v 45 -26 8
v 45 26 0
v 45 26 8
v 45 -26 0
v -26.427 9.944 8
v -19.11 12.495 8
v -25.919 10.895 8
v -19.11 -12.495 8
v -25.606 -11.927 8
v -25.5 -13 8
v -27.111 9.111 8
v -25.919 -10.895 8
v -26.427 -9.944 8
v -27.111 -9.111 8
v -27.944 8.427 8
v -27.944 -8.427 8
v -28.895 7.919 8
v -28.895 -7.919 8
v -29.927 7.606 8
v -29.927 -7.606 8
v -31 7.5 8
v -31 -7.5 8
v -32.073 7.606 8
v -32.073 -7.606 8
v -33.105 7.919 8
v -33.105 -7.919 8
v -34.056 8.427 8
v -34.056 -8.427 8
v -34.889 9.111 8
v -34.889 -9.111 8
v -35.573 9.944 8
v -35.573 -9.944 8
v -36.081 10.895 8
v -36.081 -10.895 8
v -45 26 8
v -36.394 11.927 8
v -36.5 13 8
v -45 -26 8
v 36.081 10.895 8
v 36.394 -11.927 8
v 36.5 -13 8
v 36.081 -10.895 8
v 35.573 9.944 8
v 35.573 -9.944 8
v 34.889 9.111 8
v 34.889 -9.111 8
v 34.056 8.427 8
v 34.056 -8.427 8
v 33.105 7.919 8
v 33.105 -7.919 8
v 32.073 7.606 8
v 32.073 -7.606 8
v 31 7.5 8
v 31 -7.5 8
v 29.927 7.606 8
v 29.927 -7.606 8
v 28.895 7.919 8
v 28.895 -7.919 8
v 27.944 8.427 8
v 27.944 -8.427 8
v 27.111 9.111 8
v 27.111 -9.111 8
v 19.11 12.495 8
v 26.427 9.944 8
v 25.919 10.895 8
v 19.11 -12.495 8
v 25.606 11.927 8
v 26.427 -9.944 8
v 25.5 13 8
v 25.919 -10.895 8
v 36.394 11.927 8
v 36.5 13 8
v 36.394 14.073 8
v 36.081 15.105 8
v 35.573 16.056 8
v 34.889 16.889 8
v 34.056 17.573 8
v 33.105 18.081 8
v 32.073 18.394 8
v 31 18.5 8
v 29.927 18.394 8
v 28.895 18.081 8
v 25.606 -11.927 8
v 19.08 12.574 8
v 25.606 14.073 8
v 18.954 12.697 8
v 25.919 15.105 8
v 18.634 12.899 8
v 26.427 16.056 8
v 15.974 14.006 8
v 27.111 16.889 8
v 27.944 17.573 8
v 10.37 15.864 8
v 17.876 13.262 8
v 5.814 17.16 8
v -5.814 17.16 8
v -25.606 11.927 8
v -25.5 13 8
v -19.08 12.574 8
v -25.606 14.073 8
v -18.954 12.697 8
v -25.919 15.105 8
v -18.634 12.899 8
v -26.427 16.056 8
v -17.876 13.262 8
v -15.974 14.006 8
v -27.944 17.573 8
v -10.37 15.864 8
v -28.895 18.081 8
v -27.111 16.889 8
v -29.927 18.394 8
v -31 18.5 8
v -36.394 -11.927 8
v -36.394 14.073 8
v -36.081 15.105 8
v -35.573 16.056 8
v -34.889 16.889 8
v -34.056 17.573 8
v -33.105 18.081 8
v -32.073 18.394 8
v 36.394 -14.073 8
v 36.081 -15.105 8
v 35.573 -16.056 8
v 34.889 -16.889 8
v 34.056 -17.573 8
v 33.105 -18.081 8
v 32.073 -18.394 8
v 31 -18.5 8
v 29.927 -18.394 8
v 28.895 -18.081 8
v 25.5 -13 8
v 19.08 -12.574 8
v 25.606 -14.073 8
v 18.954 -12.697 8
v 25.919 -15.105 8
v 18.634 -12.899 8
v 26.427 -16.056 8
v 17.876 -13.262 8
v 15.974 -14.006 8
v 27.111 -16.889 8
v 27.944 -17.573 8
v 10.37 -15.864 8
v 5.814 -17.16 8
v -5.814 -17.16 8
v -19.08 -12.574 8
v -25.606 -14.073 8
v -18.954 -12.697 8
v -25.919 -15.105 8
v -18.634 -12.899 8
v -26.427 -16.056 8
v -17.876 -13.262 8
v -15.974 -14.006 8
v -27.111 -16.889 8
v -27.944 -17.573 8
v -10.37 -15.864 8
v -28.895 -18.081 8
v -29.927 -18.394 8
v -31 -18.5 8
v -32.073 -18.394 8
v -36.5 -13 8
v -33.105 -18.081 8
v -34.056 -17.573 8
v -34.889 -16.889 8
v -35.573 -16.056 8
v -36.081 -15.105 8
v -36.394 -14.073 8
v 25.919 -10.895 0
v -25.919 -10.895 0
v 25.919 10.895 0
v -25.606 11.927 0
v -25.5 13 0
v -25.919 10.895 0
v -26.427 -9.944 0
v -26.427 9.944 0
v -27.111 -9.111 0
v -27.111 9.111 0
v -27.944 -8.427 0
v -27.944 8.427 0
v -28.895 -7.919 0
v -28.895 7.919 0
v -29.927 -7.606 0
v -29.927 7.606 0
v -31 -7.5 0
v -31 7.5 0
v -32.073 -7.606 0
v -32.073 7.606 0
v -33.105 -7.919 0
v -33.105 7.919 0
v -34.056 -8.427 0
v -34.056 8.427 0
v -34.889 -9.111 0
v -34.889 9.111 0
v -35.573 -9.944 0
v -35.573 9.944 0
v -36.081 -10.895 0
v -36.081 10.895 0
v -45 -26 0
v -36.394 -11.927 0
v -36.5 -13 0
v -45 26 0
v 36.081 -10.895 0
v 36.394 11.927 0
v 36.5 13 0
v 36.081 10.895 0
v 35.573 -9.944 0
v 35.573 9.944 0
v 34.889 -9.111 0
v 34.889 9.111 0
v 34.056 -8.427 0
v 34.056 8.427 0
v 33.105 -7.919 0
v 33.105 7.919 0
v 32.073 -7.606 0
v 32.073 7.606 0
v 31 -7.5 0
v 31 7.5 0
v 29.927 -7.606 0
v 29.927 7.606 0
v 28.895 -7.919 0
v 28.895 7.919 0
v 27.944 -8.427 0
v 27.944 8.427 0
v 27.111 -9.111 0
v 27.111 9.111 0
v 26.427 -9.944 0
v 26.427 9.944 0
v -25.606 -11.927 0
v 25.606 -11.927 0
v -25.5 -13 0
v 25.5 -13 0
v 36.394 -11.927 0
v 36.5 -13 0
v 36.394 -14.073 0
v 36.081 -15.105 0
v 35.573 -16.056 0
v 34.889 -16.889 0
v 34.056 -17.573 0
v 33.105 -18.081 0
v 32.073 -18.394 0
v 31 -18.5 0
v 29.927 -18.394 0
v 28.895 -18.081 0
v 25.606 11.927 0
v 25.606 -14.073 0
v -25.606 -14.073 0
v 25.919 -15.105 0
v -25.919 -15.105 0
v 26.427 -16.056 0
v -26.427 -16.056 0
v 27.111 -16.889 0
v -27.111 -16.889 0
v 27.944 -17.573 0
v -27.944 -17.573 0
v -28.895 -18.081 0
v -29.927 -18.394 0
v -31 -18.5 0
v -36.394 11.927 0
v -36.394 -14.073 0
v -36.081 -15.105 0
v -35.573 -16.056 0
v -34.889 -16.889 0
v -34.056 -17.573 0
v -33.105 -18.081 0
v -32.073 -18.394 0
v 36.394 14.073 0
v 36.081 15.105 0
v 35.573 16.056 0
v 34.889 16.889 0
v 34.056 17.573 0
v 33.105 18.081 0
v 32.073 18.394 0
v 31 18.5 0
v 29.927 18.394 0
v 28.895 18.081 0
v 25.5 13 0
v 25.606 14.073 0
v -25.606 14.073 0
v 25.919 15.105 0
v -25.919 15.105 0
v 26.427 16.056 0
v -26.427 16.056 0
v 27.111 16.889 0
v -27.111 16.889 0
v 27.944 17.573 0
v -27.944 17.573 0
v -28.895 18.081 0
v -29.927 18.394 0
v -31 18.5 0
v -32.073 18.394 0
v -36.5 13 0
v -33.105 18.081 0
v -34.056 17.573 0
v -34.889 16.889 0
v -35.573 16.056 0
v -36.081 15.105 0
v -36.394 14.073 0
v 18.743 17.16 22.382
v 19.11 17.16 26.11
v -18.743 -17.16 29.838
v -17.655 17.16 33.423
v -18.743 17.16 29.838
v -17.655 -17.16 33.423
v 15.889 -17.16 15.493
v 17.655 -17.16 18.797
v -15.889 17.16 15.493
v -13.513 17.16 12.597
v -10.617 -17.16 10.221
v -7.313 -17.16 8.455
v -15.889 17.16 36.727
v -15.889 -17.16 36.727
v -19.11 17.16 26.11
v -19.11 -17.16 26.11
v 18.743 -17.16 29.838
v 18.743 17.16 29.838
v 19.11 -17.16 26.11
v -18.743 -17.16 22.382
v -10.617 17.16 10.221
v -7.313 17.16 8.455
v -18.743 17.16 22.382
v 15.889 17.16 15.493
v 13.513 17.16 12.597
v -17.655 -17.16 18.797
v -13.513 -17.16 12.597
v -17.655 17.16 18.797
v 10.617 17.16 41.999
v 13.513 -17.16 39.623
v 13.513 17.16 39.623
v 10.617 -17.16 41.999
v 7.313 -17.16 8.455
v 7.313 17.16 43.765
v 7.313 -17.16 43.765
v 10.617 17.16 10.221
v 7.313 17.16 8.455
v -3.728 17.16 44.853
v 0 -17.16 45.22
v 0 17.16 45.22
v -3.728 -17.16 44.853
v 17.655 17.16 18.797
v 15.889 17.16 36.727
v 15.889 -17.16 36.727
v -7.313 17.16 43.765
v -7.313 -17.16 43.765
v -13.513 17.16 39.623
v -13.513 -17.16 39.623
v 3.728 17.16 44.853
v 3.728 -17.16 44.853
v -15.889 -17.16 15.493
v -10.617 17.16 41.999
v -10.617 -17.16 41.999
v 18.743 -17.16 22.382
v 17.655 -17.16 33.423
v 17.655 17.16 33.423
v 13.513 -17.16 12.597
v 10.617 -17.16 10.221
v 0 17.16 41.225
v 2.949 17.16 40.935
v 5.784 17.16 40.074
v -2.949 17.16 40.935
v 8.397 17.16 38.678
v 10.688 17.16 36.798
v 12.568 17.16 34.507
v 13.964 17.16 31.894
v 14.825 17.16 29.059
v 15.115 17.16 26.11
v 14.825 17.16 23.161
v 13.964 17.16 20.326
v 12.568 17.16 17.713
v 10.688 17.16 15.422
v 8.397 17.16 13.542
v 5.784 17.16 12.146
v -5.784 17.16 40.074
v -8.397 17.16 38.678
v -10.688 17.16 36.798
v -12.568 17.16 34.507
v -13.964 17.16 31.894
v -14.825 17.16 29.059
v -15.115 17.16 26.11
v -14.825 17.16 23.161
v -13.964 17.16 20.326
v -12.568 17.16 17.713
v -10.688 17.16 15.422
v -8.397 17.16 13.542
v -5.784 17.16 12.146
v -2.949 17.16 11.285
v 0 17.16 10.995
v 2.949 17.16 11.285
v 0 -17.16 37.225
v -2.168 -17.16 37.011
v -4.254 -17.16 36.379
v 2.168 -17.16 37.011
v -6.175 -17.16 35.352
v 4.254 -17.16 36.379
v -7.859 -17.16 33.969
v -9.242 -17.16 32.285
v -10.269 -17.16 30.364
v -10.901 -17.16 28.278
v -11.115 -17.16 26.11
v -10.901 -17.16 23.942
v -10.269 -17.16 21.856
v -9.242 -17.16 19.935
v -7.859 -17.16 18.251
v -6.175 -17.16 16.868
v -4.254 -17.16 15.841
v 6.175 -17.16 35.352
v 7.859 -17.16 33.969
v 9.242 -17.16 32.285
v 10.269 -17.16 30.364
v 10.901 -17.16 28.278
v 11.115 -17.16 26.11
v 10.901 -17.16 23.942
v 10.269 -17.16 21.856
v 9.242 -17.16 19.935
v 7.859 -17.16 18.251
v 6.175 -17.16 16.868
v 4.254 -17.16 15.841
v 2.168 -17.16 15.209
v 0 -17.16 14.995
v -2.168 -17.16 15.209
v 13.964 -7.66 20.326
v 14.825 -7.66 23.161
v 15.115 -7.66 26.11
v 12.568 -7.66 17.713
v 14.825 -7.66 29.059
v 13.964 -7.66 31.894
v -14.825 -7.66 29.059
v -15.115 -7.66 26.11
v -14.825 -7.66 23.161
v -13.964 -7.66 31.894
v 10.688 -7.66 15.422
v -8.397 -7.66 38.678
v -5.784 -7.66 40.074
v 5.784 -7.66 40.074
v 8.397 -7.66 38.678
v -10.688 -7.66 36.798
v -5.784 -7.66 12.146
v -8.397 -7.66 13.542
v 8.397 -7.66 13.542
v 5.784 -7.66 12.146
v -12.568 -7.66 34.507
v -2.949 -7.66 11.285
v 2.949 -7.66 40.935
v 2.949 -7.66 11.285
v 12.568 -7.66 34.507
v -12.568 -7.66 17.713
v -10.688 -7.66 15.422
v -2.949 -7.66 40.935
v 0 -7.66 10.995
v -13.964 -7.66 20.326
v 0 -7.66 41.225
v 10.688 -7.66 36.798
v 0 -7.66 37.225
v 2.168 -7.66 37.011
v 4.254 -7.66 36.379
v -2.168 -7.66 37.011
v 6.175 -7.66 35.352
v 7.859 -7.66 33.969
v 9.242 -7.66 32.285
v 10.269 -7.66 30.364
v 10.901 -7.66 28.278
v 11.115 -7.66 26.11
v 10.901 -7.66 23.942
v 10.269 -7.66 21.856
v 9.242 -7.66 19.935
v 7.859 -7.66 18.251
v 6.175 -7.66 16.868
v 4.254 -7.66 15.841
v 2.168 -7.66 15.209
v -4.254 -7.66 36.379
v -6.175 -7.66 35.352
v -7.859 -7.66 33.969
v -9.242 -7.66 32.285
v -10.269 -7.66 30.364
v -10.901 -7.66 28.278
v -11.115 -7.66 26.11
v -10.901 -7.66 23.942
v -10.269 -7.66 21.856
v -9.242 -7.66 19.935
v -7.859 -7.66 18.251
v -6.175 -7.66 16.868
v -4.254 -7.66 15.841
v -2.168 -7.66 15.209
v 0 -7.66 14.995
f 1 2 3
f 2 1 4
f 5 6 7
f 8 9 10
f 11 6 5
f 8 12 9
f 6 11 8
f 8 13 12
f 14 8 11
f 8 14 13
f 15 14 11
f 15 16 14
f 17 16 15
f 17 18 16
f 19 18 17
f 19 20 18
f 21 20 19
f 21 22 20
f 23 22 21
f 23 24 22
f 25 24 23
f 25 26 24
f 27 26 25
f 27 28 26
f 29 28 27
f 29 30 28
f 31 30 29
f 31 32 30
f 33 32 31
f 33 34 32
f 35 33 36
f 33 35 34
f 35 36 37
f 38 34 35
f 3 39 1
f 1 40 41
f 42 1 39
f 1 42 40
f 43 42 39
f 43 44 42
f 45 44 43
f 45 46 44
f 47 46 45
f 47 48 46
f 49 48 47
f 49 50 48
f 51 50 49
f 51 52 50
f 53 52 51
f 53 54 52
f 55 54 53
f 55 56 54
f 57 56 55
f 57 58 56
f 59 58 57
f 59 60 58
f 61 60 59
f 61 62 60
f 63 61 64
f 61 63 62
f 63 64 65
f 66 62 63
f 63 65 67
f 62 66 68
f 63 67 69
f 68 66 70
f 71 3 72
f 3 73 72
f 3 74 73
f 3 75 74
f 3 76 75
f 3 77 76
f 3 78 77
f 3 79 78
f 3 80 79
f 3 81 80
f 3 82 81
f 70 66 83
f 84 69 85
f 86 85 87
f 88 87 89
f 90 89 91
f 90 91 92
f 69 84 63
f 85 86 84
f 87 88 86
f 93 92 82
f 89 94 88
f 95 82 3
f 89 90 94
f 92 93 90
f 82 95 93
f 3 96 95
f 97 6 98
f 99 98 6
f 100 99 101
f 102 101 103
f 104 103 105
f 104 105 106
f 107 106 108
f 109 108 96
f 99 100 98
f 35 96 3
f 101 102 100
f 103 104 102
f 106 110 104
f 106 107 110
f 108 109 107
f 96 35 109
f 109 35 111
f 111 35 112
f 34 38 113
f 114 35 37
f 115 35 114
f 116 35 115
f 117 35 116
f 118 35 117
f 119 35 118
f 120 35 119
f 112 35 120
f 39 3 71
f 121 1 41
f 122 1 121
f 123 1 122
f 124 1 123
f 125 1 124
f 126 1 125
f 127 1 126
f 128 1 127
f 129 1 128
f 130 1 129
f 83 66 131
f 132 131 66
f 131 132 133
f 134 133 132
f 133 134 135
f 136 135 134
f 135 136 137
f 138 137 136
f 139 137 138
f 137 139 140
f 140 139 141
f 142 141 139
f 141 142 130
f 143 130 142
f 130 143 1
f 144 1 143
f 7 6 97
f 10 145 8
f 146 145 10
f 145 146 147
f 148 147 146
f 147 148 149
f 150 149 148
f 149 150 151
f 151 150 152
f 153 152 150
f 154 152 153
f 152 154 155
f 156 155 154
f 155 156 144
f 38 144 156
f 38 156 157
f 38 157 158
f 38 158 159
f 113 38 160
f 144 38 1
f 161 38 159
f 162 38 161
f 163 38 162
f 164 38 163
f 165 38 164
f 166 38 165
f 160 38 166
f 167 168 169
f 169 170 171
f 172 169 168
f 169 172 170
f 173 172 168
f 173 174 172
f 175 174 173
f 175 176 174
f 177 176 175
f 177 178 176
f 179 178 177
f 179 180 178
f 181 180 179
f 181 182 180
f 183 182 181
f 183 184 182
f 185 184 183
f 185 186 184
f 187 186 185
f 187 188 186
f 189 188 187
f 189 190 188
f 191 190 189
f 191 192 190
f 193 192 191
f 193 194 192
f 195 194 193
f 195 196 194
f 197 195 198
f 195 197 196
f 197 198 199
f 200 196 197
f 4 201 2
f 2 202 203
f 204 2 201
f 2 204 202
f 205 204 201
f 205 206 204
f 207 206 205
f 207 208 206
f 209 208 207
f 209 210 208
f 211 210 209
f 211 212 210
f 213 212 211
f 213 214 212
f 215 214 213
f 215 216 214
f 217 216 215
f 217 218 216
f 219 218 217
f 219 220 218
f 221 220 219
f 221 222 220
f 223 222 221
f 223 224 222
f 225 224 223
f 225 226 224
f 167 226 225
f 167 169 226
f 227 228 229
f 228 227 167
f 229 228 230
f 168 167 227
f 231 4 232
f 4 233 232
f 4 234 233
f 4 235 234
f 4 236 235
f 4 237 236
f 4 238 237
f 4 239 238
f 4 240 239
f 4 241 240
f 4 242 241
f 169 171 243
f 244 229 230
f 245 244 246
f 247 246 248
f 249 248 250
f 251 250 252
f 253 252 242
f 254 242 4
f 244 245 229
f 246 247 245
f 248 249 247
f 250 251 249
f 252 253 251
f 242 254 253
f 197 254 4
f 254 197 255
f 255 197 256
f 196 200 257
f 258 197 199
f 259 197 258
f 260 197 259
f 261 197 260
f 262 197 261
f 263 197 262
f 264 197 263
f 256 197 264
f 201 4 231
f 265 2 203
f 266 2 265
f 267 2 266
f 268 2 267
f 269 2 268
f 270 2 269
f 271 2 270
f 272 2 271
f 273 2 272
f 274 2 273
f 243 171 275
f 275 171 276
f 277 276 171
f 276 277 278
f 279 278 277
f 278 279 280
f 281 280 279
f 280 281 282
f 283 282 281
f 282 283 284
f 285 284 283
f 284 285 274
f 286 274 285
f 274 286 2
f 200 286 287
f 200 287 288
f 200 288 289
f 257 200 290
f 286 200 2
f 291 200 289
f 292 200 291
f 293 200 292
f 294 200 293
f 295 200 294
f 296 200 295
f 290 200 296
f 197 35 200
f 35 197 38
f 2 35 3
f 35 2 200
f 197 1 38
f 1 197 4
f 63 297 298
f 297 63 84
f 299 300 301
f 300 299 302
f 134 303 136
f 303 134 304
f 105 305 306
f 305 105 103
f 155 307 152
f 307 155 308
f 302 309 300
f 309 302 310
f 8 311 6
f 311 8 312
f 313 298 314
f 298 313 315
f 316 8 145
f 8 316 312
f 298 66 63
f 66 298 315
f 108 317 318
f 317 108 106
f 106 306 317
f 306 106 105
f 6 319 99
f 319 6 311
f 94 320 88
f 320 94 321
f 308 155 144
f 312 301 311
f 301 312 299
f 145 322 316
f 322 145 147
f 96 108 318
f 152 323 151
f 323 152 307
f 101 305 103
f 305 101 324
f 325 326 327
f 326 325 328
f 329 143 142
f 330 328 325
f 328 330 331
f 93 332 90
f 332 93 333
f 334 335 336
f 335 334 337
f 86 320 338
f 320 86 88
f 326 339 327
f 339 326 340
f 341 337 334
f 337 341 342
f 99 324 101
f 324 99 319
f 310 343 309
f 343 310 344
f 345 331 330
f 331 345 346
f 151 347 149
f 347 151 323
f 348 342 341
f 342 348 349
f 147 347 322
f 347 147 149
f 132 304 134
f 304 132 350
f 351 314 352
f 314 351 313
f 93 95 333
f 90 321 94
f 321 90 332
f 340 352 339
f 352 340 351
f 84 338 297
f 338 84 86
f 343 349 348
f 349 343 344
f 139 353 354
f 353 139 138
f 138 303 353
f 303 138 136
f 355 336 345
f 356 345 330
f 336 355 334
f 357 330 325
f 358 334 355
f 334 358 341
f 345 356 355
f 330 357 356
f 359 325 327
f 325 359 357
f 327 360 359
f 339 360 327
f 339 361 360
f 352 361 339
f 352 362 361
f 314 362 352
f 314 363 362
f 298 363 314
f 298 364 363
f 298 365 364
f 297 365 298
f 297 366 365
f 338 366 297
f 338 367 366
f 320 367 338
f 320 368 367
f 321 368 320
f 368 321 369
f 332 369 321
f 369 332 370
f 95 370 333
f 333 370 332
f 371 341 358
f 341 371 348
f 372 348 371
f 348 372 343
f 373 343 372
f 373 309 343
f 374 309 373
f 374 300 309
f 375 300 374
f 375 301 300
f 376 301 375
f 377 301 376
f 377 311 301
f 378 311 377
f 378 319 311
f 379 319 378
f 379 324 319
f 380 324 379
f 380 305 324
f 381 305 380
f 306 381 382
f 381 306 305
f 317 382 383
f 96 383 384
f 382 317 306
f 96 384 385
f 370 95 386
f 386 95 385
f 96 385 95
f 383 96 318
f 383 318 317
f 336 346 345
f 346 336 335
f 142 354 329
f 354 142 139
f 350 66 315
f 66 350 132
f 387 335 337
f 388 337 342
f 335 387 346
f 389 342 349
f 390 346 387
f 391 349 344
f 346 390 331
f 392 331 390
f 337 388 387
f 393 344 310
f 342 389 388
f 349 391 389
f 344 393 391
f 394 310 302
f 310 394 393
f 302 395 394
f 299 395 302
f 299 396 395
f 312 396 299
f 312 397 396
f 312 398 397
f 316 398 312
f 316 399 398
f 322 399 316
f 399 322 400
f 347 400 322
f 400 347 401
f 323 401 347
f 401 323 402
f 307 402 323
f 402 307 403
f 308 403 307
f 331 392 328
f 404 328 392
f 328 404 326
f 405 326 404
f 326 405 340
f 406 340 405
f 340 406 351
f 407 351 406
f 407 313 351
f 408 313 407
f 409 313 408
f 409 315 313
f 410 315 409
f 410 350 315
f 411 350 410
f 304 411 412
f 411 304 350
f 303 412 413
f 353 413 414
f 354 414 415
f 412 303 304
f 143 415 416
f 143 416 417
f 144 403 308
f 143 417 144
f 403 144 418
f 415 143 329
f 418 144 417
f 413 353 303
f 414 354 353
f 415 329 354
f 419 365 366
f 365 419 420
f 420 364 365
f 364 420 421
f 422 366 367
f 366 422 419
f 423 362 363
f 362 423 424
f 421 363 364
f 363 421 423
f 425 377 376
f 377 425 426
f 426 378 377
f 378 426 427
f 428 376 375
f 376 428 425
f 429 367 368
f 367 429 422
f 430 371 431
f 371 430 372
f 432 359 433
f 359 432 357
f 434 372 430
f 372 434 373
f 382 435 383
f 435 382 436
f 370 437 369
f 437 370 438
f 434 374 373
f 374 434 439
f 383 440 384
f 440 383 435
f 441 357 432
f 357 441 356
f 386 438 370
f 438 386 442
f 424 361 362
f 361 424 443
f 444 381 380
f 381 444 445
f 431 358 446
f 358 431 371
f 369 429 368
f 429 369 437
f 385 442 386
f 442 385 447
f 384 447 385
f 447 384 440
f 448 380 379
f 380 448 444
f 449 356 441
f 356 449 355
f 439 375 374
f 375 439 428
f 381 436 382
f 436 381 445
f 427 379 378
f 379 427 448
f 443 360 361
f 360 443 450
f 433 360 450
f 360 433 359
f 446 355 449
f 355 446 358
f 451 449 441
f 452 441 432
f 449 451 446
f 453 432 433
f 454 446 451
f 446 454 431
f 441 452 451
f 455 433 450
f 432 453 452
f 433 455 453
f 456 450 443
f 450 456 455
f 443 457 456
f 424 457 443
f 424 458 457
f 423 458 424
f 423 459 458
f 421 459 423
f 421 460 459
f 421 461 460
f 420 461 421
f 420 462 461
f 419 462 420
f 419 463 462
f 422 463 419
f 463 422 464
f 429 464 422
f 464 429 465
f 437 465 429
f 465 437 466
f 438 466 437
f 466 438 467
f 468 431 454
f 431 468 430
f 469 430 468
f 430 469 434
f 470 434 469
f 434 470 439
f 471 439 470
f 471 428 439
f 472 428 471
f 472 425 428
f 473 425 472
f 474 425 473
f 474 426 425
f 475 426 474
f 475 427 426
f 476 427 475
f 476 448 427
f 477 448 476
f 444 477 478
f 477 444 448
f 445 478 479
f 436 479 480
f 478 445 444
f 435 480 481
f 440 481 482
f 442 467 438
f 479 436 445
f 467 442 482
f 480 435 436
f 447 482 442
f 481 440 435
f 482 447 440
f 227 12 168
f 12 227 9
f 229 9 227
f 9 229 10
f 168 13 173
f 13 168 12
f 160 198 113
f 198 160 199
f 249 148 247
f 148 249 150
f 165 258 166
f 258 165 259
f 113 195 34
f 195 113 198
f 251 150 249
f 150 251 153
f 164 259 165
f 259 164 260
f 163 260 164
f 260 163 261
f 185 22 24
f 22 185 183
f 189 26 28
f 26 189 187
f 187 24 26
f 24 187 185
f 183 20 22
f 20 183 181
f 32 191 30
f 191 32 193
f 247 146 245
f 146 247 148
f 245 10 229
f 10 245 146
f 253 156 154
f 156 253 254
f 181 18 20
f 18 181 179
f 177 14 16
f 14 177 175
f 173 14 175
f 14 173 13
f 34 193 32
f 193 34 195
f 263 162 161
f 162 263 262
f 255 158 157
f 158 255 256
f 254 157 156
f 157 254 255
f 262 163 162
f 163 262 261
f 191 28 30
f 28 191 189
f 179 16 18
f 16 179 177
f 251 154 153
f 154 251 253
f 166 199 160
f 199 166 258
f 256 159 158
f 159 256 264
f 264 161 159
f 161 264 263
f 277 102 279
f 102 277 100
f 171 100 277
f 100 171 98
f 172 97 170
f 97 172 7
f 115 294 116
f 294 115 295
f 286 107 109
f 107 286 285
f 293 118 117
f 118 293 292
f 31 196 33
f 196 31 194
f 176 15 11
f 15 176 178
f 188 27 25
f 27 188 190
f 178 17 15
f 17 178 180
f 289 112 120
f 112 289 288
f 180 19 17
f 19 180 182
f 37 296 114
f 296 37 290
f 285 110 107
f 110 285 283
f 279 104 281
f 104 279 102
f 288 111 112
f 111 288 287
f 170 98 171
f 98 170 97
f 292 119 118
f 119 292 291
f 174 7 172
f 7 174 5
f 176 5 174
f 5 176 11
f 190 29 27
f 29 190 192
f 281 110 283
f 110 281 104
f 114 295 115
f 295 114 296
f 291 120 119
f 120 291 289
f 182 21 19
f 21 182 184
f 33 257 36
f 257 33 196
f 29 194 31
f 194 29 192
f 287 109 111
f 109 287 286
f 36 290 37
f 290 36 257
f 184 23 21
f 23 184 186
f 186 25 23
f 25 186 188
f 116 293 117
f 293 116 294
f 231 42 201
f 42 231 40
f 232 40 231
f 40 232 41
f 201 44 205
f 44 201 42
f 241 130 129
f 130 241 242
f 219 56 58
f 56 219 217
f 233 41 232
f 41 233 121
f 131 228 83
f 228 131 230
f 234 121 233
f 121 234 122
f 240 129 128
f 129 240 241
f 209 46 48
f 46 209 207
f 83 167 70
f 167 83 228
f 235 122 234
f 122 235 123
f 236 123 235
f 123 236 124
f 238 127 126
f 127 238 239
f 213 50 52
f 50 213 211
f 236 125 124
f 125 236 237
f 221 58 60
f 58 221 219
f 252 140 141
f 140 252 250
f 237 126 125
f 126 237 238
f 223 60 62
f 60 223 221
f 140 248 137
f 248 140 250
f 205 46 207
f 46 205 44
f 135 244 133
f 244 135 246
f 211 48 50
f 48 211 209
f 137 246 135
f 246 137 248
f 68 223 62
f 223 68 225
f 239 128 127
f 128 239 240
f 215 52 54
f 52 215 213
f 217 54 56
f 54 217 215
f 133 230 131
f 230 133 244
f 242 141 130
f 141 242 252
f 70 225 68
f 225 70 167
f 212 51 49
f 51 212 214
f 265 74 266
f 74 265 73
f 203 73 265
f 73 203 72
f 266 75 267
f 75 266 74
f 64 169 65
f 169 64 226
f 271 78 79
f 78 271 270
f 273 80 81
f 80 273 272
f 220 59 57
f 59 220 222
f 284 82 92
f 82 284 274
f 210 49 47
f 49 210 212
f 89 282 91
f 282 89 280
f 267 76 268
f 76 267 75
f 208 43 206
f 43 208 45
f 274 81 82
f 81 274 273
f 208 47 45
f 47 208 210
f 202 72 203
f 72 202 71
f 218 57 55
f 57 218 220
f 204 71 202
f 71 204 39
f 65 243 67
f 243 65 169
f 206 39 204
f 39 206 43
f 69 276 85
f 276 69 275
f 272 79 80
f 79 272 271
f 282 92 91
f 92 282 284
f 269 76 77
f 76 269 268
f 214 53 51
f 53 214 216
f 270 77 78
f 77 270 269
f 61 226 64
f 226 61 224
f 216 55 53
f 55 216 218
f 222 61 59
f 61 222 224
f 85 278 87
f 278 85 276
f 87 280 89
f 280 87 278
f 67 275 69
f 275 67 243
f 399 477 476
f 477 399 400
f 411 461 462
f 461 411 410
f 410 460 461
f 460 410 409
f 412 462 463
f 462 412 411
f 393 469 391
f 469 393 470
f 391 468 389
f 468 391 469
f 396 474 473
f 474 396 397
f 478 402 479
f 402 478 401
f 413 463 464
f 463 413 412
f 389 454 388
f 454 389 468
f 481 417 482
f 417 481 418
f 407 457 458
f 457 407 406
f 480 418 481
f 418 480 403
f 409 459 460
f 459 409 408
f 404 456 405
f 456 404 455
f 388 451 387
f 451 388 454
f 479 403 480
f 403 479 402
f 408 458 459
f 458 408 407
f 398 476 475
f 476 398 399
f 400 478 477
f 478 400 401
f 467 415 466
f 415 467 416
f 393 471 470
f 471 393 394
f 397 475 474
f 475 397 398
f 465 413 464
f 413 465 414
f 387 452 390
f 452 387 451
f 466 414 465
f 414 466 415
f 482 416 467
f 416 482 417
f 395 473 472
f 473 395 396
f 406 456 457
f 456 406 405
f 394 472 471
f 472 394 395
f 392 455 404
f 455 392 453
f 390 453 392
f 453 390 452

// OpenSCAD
$fn = 32;

// ----------------------------------------------------------------------
// Bearing block: 90 x 52 mm base, 22.23 mm bore at 26.11 mm
// ----------------------------------------------------------------------

// --- parameters (mm) ---
base_w = 90;              // base width
base_d = 52;              // base depth
base_t = 8;               // base thickness
bore_d = 22.23;           // shaft / bearing bore
house_r = 19.11;          // housing outer radius
house_len = 34.32;        // housing length along the shaft
foot_w = 38.22;           // foot width under the housing
foot_len = 24.32;         // foot length along the shaft
axis_z = 26.11;           // bore axis height above the base
holes_d = 11;             // mounting holes
hole_x = 31;              // mounting hole spacing
seat_d = 12;              // bearing seat depth
seat_wall = 4;            // seat wall thickness

difference() {
  union() {
    /* base plate with its underside on z = 0 */
    translate([0, 0, base_t / 2]) cube([base_w, base_d, base_t], center = true);
    /* hull foot: a straight web blending into the round housing */
    hull() {
      translate([0, 0, base_t - 0.5]) cube([foot_w, foot_len, 1.6], center = true);
      translate([0, 0, axis_z]) rotate([-90, 0, 0]) cylinder(h = house_len, d = 2 * house_r, center = true);
    }
  }
  /* bore through the housing, 2.5 mm clear on both sides */
  translate([0, 0, axis_z]) rotate([-90, 0, 0]) cylinder(h = house_len + 5, d = bore_d, center = true);
  /* bearing seats, recessed into both ends of the housing */
  for (sy = [-1, 1]) {
    translate([0, sy * (house_len / 2 - seat_d + 2.5), axis_z]) rotate([-90, 0, 0]) cylinder(h = seat_d + 5, d = bore_d + 2 * seat_wall);
  }
  /* mounting holes through the base plate */
  for (hx = [-31, 31]) {
    for (hy = [-13, 13]) {
      translate([hx, hy, -2.5]) cylinder(h = base_t + 5, d = holes_d);
    }
  }
}
